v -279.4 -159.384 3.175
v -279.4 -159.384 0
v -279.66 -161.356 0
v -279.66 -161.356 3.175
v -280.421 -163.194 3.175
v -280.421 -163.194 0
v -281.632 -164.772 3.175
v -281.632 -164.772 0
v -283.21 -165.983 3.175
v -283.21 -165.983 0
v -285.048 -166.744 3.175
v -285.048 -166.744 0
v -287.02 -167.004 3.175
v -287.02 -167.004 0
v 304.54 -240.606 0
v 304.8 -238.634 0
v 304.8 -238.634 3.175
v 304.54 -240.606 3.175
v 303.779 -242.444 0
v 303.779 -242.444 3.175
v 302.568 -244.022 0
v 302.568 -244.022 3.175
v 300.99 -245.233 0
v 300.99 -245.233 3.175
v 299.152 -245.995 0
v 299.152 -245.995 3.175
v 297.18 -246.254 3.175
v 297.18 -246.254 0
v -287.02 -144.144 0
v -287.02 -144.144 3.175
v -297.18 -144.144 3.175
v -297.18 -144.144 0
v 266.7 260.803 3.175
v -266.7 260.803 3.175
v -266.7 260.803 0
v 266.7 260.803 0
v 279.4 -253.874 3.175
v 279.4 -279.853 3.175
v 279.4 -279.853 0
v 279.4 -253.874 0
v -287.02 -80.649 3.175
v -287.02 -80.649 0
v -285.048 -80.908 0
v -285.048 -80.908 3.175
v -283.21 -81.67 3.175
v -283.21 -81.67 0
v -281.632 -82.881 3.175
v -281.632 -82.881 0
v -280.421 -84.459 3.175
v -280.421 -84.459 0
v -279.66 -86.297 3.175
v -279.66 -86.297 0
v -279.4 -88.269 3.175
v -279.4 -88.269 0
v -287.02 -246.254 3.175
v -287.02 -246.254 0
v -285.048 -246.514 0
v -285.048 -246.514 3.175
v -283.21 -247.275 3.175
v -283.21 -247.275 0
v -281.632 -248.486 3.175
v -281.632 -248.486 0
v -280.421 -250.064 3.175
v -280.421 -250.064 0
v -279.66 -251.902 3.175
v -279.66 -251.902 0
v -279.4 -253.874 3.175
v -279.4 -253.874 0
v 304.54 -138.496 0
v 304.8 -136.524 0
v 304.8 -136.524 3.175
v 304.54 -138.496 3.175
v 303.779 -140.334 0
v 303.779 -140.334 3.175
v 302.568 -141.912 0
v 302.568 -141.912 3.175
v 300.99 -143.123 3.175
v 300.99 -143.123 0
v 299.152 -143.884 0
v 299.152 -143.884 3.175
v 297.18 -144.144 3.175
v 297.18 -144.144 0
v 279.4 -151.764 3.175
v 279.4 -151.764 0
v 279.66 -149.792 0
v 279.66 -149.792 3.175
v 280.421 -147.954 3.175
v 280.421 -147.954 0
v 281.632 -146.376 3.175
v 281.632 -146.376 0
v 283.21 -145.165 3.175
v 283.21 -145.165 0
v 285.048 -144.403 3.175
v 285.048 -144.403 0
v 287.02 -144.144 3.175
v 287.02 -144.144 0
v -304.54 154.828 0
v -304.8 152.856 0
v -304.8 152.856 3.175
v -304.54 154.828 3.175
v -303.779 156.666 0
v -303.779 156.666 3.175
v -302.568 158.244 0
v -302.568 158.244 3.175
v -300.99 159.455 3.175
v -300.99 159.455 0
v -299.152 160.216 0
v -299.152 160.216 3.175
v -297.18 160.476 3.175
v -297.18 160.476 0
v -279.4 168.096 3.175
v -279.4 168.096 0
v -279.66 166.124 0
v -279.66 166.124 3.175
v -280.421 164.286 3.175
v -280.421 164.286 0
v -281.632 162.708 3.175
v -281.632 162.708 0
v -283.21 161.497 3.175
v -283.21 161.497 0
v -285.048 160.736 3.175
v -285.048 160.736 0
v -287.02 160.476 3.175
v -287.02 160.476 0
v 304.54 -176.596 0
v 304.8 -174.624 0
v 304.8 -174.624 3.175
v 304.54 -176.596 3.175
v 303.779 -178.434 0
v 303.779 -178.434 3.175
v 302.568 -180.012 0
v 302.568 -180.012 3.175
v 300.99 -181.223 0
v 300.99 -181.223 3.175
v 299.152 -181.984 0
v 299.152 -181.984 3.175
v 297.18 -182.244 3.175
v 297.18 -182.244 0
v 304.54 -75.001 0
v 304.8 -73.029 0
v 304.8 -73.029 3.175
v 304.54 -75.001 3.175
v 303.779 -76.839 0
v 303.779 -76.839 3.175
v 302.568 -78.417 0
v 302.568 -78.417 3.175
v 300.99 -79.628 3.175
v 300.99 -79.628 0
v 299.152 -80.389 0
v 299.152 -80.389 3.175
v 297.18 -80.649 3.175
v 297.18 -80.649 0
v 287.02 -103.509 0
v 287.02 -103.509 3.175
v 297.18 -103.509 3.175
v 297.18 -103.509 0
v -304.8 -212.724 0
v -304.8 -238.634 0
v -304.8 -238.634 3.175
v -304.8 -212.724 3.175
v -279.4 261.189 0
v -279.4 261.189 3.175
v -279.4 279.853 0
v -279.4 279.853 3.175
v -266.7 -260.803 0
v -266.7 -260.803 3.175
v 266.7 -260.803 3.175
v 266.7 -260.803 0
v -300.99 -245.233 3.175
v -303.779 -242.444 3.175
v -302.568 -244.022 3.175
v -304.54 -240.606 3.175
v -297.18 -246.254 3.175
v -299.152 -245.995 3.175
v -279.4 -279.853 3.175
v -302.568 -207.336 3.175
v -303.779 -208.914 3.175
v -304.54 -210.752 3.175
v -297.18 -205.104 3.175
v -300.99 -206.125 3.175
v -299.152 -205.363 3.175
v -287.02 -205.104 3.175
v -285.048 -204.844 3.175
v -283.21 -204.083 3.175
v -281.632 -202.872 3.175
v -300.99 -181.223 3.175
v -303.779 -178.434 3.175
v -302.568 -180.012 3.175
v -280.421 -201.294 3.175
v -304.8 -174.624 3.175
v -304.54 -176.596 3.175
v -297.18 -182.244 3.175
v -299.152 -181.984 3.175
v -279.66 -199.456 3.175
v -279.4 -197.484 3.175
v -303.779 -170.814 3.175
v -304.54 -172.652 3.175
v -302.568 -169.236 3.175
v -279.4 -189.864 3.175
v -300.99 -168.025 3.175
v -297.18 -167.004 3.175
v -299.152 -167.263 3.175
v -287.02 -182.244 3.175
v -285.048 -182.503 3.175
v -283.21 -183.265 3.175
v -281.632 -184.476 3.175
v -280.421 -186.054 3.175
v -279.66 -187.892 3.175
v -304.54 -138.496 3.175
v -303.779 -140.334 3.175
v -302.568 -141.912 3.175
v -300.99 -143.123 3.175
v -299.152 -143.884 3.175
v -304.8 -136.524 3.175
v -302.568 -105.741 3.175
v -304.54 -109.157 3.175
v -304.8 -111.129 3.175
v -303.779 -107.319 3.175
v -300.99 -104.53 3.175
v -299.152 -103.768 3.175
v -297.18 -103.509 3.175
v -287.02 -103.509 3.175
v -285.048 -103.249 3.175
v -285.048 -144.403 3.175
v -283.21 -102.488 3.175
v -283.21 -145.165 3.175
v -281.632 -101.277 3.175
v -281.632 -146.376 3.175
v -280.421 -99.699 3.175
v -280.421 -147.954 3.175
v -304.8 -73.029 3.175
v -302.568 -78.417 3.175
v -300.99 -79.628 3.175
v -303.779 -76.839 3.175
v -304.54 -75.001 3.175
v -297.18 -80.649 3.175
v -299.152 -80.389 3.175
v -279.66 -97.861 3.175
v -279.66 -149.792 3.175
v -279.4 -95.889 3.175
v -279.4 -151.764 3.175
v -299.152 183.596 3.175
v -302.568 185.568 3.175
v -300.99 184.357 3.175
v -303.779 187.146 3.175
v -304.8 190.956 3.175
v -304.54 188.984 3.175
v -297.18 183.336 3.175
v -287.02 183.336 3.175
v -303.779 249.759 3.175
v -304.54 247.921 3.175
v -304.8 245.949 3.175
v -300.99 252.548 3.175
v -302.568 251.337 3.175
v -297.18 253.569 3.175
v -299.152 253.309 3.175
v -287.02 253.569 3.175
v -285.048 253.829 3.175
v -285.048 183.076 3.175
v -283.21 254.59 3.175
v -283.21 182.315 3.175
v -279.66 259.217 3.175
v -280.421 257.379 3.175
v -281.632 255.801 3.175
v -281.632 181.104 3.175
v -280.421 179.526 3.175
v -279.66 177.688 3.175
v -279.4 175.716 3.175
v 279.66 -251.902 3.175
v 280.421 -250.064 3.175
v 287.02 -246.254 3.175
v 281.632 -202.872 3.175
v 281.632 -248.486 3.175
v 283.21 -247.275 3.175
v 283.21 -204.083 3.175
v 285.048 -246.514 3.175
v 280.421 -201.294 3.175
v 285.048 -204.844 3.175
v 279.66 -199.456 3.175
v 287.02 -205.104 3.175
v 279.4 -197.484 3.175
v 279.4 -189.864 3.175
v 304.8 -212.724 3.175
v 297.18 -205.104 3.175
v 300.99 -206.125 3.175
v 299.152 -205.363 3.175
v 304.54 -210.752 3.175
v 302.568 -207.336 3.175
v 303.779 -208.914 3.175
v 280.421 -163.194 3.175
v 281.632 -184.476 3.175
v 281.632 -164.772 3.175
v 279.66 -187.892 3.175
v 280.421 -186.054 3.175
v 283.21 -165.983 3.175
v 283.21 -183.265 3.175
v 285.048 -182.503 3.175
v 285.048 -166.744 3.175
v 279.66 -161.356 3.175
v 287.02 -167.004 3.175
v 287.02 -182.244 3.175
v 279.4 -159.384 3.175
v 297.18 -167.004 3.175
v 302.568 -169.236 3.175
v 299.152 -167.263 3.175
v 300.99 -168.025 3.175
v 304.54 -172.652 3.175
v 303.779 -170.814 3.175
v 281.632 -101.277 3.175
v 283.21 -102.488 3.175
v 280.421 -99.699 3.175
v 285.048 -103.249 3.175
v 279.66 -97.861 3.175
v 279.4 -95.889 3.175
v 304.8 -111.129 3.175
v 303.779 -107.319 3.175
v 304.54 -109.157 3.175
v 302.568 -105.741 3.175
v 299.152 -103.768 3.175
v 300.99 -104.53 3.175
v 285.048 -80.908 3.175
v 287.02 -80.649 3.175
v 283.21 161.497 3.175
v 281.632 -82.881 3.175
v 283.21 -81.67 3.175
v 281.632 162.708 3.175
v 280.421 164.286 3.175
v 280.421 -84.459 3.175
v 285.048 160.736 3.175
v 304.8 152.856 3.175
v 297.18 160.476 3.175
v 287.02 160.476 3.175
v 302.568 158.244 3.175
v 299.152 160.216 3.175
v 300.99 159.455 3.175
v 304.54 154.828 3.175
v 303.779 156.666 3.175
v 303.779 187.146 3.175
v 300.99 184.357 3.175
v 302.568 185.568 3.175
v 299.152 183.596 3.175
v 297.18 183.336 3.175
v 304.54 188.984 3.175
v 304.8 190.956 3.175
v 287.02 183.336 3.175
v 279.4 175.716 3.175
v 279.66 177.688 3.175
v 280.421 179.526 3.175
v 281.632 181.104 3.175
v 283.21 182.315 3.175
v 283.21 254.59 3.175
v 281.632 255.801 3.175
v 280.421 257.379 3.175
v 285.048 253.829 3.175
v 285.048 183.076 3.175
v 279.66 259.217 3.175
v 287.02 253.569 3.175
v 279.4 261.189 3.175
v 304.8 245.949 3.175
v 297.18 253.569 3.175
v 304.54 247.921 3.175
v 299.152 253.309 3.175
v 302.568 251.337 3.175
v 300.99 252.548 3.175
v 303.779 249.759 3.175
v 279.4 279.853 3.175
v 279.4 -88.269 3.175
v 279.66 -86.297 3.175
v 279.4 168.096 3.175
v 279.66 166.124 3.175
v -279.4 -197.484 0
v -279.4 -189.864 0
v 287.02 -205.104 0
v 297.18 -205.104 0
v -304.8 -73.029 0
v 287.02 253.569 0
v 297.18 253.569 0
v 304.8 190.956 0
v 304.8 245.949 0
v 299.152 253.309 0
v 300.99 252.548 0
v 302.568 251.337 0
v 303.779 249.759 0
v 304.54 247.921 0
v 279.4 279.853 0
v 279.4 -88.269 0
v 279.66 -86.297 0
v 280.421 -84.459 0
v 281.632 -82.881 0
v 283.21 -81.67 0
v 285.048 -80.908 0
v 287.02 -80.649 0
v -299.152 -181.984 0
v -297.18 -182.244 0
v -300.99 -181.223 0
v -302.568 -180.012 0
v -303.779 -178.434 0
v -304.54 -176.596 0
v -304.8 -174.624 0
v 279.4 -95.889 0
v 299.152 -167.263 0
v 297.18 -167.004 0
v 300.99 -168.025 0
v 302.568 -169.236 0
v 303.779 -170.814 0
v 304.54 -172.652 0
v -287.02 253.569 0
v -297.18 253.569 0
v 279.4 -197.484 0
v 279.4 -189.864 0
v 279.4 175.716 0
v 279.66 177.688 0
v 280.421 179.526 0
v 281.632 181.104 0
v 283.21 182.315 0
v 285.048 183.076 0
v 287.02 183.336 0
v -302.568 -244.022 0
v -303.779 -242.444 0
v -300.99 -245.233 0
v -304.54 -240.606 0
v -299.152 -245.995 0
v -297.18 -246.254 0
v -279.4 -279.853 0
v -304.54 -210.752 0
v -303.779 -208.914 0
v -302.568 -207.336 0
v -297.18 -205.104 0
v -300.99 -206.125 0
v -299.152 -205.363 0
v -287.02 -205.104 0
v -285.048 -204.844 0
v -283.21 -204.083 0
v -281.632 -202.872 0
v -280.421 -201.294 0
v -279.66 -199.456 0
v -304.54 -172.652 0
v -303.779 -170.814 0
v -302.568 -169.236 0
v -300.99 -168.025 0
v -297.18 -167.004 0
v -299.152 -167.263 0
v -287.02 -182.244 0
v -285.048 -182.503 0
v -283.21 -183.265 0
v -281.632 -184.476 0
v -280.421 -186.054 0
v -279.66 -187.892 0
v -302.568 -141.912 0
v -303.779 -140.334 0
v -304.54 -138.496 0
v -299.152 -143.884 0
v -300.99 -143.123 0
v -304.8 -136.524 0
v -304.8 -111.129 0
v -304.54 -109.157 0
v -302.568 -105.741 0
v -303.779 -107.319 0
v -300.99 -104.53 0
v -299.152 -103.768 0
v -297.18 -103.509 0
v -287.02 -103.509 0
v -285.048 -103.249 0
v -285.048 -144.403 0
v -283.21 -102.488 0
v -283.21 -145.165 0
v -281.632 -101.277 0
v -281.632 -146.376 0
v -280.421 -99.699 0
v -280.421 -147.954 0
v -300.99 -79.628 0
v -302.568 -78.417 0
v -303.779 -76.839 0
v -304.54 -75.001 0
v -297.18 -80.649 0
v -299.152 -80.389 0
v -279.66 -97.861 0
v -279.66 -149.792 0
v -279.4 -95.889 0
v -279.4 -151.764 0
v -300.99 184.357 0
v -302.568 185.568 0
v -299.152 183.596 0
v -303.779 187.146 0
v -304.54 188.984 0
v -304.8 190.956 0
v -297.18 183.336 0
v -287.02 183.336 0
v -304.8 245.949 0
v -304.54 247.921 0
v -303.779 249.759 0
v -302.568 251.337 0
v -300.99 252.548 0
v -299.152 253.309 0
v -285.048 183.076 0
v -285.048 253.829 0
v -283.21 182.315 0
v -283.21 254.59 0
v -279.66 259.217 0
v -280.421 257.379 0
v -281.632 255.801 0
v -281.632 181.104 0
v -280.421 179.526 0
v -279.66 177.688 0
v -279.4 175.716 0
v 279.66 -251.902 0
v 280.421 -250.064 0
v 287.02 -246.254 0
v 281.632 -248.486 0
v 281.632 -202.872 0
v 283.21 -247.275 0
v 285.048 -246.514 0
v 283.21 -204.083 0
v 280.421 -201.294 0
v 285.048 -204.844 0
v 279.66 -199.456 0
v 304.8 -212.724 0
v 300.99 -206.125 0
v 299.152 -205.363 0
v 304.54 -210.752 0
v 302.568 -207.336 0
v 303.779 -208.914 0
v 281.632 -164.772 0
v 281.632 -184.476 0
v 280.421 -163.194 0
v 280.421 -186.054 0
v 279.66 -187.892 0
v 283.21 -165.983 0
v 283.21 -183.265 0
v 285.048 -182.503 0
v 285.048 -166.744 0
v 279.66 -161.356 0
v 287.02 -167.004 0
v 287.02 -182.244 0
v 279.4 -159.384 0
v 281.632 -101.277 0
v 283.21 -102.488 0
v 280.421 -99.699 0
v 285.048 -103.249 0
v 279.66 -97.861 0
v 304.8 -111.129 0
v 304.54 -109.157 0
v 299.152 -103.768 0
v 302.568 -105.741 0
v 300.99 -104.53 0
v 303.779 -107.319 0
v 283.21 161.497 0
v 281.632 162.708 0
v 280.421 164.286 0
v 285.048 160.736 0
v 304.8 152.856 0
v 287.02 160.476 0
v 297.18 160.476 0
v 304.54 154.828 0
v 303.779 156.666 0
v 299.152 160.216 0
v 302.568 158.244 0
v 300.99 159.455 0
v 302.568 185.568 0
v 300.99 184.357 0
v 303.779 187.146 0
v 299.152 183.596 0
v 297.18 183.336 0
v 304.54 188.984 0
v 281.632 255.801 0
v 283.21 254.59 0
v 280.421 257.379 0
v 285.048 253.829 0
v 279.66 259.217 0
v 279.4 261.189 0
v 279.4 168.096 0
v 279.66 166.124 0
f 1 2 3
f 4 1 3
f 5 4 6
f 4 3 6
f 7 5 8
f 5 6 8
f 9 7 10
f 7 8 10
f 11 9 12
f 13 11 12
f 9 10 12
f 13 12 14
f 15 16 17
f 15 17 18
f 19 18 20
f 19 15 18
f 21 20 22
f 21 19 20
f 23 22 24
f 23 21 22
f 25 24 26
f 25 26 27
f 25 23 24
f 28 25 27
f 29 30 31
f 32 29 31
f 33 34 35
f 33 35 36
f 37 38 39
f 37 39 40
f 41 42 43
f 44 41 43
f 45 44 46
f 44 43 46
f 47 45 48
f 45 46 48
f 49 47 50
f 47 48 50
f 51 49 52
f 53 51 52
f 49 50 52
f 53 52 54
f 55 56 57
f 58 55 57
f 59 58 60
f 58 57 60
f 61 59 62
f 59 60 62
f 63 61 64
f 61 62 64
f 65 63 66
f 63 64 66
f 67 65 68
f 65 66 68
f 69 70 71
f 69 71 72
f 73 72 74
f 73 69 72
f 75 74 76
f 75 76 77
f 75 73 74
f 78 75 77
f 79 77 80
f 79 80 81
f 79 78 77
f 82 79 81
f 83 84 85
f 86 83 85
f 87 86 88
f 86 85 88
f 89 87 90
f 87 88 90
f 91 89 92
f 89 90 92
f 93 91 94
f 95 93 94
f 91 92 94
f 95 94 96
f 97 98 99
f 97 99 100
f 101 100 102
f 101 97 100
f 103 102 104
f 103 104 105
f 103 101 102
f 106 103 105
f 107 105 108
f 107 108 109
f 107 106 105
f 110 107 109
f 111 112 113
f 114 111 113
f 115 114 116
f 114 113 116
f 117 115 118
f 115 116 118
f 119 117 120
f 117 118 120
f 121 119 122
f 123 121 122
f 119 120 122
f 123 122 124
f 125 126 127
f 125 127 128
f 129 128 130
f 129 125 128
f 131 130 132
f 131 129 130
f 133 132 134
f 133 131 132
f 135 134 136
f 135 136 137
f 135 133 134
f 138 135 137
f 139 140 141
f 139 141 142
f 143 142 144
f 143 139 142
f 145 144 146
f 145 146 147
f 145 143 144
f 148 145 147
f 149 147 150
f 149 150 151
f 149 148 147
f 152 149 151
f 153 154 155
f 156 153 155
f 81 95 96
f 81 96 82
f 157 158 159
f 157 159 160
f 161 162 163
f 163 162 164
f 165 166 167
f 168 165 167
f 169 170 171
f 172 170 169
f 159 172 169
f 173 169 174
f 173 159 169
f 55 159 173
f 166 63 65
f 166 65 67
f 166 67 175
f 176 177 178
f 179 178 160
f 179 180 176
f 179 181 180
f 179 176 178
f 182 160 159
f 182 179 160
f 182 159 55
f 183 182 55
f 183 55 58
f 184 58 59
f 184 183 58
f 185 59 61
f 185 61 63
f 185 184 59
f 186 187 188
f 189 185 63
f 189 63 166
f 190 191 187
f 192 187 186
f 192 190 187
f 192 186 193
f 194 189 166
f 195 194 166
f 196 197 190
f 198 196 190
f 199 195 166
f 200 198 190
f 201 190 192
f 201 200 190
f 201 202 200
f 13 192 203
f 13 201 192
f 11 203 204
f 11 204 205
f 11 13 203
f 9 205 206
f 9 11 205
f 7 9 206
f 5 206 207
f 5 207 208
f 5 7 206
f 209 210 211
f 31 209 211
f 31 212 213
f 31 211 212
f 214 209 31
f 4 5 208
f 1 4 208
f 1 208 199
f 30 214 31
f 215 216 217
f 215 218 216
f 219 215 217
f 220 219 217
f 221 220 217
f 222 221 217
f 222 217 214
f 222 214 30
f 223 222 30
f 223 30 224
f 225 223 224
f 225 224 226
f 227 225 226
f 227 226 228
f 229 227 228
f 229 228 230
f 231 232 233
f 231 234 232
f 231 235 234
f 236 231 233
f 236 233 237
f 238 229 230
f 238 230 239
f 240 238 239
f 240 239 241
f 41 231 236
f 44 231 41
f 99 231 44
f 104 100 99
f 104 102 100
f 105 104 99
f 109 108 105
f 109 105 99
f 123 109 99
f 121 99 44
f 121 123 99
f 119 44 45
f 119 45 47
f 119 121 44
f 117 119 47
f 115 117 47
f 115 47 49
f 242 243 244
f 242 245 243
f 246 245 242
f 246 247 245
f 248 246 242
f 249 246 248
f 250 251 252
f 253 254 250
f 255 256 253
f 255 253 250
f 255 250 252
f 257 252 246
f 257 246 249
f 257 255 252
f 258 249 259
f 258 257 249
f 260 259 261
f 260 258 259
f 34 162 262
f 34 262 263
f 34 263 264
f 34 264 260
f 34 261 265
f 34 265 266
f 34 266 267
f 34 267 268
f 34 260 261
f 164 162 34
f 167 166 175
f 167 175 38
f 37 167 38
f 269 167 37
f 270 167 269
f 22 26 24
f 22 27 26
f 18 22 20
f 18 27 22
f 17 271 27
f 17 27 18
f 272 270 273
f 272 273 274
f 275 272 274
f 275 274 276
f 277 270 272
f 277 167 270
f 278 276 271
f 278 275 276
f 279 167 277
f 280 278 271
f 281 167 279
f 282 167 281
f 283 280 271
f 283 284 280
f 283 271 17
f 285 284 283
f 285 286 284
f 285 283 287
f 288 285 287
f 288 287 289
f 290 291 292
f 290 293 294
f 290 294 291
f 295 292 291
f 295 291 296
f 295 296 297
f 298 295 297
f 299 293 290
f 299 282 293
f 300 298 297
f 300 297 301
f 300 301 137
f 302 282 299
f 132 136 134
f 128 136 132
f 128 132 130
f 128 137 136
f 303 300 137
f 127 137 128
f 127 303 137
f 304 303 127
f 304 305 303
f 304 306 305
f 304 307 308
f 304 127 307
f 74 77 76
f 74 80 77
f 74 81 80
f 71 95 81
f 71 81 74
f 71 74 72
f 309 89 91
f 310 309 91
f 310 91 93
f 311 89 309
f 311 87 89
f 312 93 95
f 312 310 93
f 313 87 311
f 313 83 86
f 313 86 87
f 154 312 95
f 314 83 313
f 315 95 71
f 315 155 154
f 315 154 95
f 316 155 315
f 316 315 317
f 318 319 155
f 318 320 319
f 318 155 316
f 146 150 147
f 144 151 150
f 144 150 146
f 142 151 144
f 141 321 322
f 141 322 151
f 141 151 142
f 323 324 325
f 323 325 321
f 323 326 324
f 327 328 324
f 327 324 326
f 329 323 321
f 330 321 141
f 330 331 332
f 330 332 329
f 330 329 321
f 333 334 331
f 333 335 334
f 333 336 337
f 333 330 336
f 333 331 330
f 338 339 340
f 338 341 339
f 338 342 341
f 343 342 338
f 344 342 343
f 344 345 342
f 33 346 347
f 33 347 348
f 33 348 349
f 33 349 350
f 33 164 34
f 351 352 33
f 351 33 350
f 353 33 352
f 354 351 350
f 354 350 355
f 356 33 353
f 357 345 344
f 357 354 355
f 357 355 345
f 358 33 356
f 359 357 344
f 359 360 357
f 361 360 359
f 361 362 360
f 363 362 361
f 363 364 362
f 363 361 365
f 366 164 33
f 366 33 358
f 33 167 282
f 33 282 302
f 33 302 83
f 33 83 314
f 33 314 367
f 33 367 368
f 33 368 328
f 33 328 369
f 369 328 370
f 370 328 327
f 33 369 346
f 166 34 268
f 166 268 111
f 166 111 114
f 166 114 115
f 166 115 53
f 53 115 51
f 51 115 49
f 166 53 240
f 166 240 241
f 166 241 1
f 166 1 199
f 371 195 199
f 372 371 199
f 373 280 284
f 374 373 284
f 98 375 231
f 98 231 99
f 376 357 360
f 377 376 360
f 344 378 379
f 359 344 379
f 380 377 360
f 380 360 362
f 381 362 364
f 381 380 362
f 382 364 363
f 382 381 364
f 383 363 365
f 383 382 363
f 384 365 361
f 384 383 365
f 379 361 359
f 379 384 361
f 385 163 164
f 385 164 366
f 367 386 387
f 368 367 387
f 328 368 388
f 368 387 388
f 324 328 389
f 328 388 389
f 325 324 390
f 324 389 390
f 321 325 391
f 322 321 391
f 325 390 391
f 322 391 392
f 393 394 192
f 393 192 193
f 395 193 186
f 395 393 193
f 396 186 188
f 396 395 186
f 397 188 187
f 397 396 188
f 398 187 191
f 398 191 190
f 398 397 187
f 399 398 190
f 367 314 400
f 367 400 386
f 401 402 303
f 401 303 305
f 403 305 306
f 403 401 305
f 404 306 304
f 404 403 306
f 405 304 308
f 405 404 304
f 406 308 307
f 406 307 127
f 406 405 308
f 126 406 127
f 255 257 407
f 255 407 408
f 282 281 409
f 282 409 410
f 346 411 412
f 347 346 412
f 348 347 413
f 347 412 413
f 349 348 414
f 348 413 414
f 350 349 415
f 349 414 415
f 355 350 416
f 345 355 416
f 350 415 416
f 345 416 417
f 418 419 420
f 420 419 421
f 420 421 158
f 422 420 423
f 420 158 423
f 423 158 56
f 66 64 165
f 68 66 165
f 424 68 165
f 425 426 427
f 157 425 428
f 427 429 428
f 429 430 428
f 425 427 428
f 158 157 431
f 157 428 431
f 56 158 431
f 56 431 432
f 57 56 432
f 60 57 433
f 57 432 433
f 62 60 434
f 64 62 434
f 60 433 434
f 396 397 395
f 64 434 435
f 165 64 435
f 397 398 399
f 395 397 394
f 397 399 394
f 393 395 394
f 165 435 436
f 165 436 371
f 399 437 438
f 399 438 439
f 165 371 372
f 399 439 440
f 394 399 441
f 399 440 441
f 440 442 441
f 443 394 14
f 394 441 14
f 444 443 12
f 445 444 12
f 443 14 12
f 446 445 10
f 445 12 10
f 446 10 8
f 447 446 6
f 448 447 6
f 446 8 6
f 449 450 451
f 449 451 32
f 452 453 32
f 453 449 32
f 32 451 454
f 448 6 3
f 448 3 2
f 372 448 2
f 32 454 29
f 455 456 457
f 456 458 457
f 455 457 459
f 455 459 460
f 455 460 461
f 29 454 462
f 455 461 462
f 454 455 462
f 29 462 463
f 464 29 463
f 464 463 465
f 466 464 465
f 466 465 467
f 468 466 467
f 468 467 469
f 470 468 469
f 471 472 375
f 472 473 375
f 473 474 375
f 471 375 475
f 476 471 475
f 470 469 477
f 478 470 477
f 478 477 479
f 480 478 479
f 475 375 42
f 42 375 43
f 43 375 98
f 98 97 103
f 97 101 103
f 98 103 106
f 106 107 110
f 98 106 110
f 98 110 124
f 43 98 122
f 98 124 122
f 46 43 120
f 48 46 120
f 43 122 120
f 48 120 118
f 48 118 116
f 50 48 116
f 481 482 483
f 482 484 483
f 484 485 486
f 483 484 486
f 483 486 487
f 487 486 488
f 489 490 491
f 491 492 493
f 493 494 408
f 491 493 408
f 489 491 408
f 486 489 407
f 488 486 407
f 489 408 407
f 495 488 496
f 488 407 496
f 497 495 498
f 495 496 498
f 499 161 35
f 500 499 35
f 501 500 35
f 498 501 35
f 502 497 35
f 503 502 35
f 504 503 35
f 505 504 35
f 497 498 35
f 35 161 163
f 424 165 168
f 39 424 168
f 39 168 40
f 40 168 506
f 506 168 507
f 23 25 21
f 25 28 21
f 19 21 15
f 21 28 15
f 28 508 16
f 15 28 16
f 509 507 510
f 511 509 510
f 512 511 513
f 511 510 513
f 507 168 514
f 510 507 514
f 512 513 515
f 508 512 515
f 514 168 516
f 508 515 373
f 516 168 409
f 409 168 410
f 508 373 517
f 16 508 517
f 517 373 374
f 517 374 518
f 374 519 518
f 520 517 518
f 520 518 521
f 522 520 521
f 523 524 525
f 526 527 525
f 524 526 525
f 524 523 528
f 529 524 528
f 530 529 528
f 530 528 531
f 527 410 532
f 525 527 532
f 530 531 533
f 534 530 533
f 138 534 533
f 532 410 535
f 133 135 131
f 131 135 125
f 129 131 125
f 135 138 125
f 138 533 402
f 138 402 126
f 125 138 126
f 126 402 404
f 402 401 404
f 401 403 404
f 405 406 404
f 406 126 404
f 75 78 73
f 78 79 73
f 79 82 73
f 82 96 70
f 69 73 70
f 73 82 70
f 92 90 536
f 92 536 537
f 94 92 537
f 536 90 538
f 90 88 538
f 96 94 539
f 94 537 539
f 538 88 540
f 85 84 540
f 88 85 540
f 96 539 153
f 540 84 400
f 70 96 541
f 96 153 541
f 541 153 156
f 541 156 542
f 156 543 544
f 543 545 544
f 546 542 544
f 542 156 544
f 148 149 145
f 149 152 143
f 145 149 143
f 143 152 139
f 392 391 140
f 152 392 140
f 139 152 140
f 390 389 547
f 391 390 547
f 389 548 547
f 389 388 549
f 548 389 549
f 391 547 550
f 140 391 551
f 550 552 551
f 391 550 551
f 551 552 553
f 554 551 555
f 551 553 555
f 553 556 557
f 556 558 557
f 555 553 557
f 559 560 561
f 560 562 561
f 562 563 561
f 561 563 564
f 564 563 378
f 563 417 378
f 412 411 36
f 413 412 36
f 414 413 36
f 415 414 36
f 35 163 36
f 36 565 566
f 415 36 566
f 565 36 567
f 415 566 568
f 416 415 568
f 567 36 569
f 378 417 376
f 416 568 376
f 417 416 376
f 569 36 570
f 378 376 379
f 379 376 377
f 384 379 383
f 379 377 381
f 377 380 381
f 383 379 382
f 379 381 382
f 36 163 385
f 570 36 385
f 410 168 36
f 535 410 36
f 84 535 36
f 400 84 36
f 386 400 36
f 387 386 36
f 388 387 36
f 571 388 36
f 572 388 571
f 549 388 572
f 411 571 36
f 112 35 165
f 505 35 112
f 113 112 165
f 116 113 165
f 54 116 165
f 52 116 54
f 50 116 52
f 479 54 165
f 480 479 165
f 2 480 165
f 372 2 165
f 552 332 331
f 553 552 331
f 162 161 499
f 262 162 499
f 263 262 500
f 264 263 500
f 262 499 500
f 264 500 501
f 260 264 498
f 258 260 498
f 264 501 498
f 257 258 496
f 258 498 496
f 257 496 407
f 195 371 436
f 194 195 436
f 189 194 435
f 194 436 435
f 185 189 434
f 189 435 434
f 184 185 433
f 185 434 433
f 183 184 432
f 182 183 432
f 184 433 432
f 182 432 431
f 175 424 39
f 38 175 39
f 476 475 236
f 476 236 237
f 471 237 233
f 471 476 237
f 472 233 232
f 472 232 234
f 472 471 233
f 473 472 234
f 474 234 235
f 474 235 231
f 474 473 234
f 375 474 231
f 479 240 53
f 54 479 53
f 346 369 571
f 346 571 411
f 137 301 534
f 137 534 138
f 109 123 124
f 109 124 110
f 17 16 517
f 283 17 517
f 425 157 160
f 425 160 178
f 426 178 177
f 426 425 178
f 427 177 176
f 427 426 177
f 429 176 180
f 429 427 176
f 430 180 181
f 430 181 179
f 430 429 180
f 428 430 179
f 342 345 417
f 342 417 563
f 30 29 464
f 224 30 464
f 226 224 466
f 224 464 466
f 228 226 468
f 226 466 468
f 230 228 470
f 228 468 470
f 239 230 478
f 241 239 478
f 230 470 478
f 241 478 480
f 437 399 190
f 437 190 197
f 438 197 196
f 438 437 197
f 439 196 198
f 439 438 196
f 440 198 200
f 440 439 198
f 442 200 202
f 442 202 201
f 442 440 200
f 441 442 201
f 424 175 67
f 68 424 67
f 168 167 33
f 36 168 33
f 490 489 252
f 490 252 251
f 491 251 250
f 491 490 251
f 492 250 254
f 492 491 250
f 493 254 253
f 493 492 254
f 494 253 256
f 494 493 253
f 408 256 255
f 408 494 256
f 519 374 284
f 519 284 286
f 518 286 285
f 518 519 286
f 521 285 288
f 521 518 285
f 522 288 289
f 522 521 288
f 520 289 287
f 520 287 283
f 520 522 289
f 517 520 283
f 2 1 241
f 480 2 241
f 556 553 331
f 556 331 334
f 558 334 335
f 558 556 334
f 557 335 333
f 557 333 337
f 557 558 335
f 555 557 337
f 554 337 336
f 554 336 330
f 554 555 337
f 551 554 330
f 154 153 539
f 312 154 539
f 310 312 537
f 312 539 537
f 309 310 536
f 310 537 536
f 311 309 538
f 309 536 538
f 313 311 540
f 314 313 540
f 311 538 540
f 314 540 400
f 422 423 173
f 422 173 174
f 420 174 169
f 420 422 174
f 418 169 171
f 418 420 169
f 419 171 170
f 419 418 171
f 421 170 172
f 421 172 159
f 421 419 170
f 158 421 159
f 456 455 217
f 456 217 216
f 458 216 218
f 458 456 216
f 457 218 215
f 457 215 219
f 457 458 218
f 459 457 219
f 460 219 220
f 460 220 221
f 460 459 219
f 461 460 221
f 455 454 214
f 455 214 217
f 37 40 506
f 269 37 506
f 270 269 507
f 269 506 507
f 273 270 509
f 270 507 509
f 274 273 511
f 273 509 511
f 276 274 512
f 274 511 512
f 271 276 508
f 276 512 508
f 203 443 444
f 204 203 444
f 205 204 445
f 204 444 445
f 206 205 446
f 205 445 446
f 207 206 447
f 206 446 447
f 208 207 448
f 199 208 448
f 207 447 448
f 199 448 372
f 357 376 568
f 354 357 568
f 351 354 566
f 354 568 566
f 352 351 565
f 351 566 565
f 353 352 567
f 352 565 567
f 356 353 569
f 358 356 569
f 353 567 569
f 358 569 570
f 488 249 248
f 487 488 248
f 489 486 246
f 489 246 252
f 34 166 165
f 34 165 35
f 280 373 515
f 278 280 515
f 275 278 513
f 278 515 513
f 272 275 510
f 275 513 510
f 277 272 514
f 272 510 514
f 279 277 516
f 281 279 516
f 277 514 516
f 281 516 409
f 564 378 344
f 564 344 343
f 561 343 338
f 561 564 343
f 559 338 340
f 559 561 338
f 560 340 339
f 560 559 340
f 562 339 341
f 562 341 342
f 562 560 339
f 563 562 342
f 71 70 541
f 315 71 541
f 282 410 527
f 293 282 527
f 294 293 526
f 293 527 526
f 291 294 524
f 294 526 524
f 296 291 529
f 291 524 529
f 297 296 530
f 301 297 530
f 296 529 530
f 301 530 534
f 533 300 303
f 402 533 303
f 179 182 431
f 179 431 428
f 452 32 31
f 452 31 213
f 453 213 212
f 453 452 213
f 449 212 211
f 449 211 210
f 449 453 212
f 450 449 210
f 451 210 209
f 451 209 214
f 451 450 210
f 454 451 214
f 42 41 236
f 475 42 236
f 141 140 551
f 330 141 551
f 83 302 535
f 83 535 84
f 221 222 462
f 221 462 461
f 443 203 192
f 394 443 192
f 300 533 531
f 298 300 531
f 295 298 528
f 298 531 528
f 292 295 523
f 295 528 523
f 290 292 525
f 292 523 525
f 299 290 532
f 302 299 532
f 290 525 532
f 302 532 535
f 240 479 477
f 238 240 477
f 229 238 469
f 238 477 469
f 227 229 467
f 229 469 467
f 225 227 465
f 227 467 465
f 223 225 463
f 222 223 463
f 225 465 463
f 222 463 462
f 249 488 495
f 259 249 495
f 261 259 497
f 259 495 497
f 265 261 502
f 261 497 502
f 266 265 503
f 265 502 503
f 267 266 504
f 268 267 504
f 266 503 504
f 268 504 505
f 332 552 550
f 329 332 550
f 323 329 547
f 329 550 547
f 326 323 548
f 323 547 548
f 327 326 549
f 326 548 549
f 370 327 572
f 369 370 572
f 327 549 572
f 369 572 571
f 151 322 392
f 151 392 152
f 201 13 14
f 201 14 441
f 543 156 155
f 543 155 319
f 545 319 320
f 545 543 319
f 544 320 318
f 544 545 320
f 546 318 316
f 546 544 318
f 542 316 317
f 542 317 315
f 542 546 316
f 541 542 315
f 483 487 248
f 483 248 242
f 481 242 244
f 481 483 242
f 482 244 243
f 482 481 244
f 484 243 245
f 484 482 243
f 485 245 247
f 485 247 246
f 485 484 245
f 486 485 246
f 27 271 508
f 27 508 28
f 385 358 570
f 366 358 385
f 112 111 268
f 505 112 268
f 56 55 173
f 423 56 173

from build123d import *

# Parameters (mm, degrees)
SKETCH1_W           = 609.6
SKETCH1_H           = 559.70678
BOSS_EXTRUDE1_DEPTH = 3.175
SKETCH6_W           = 25.4
SKETCH6_H           = 33.599180378
SKETCH6_H_2         = 22.86
SKETCH6_H_3         = 26.284283972
CUT_EXTRUDE1_DEPTH  = 414.800725615
SKETCH7_W           = 533.4
SKETCH7_H           = 521.60678
CUT_EXTRUDE2_DEPTH  = 414.800725615
FILLET1_START       = -1
FILLET1_DEPTH       = 5
FILLET1_2_DEPTH     = 3.175


with BuildPart() as part:
    # Sketch1 → Boss-Extrude1 (new body)
    with BuildSketch(Plane.XY):
        Rectangle(SKETCH1_W, SKETCH1_H)
    extrude(amount=BOSS_EXTRUDE1_DEPTH)

    # Sketch6 → Cut-Extrude1 (cut, through all)
    with BuildSketch(Plane.XY.offset(3.175)):
        with Locations((292.1, -263.053799811)):
            Rectangle(SKETCH6_W, SKETCH6_H)
        with Locations((292.1, -193.67373)):
            Rectangle(SKETCH6_W, SKETCH6_H_2)
        with Locations((292.1, -155.57373)):
            Rectangle(SKETCH6_W, SKETCH6_H_2)
        with Locations((292.1, -92.07881)):
            Rectangle(SKETCH6_W, SKETCH6_H_2)
        with Locations((292.1, 171.90593)):
            Rectangle(SKETCH6_W, SKETCH6_H_2)
        with Locations((292.1, 266.711248014)):
            Rectangle(SKETCH6_W, SKETCH6_H_3)
    cut_extrude1 = extrude(amount=-CUT_EXTRUDE1_DEPTH, mode=Mode.SUBTRACT)

    # Sketch7 → Cut-Extrude2 (cut, through all)
    with BuildSketch(Plane.XY.offset(3.175)):
        Rectangle(SKETCH7_W, SKETCH7_H)
    extrude(amount=-CUT_EXTRUDE2_DEPTH, mode=Mode.SUBTRACT)

    # Mirror1: Cut-Extrude1 across plane
    add(cut_extrude1.mirror(Plane(origin=(0, 0, 0), x_dir=(0, 0, 1), z_dir=(1, 0, 0))), mode=Mode.SUBTRACT)

    # Fillet1: read off the stored shape, not the designer's step
    # Fillet1 outline → Fillet1 (cut)
    with BuildSketch(Plane.XY.offset(FILLET1_START)):
        with BuildLine():
            ThreePointArc((-297.18, -246.254209622), (-302.568153673, -244.022363295), (-304.8, -238.634209622))
            Line((-304.8, -238.634209622), (-304.8, -246.254209622))
            Line((-304.8, -246.254209622), (-297.18, -246.254209622))
        make_face()
        with BuildLine():
            ThreePointArc((-304.8, -212.72373), (-302.568153673, -207.335576327), (-297.18, -205.10373))
            Line((-297.18, -205.10373), (-304.8, -205.10373))
            Line((-304.8, -205.10373), (-304.8, -212.72373))
        make_face()
        with BuildLine():
            ThreePointArc((-297.18, -182.24373), (-302.568153673, -180.011883673), (-304.8, -174.62373))
            Line((-304.8, -174.62373), (-304.8, -182.24373))
            Line((-304.8, -182.24373), (-297.18, -182.24373))
        make_face()
        with BuildLine():
            ThreePointArc((-304.8, -174.62373), (-302.568153673, -169.235576327), (-297.18, -167.00373))
            Line((-297.18, -167.00373), (-304.8, -167.00373))
            Line((-304.8, -167.00373), (-304.8, -174.62373))
        make_face()
        with BuildLine():
            ThreePointArc((-297.18, -144.14373), (-302.568153673, -141.911883673), (-304.8, -136.52373))
            Line((-304.8, -136.52373), (-304.8, -144.14373))
            Line((-304.8, -144.14373), (-297.18, -144.14373))
        make_face()
        with BuildLine():
            ThreePointArc((-304.8, -111.12881), (-302.568153673, -105.740656327), (-297.18, -103.50881))
            Line((-297.18, -103.50881), (-304.8, -103.50881))
            Line((-304.8, -103.50881), (-304.8, -111.12881))
        make_face()
        with BuildLine():
            ThreePointArc((-297.18, -80.64881), (-302.568153673, -78.416963673), (-304.8, -73.02881))
            Line((-304.8, -73.02881), (-304.8, -80.64881))
            Line((-304.8, -80.64881), (-297.18, -80.64881))
        make_face()
        with BuildLine():
            ThreePointArc((-304.8, 152.85593), (-302.568153673, 158.244083673), (-297.18, 160.47593))
            Line((-297.18, 160.47593), (-304.8, 160.47593))
            Line((-304.8, 160.47593), (-304.8, 152.85593))
        make_face()
        with BuildLine():
            ThreePointArc((-297.18, 183.33593), (-302.568153673, 185.567776327), (-304.8, 190.95593))
            Line((-304.8, 190.95593), (-304.8, 183.33593))
            Line((-304.8, 183.33593), (-297.18, 183.33593))
        make_face()
        with BuildLine():
            ThreePointArc((-304.8, 245.949106028), (-302.568153672, 251.3372597), (-297.18, 253.569106028))
            Line((-297.18, 253.569106028), (-304.8, 253.569106028))
            Line((-304.8, 253.569106028), (-304.8, 245.949106028))
        make_face()
        with BuildLine():
            ThreePointArc((297.18, 253.569106028), (302.568153672, 251.3372597), (304.8, 245.949106028))
            Line((304.8, 245.949106028), (304.8, 253.569106028))
            Line((304.8, 253.569106028), (297.18, 253.569106028))
        make_face()
        with BuildLine():
            ThreePointArc((304.8, 190.95593), (302.568153673, 185.567776327), (297.18, 183.33593))
            Line((297.18, 183.33593), (304.8, 183.33593))
            Line((304.8, 183.33593), (304.8, 190.95593))
        make_face()
        with BuildLine():
            ThreePointArc((297.18, 160.47593), (302.568153673, 158.244083673), (304.8, 152.85593))
            Line((304.8, 152.85593), (304.8, 160.47593))
            Line((304.8, 160.47593), (297.18, 160.47593))
        make_face()
        with BuildLine():
            ThreePointArc((304.8, -73.02881), (302.568153673, -78.416963673), (297.18, -80.64881))
            Line((297.18, -80.64881), (304.8, -80.64881))
            Line((304.8, -80.64881), (304.8, -73.02881))
        make_face()
        with BuildLine():
            ThreePointArc((297.18, -103.50881), (302.568153673, -105.740656327), (304.8, -111.12881))
            Line((304.8, -111.12881), (304.8, -103.50881))
            Line((304.8, -103.50881), (297.18, -103.50881))
        make_face()
        with BuildLine():
            ThreePointArc((304.8, -136.52373), (302.568153673, -141.911883673), (297.18, -144.14373))
            Line((297.18, -144.14373), (304.8, -144.14373))
            Line((304.8, -144.14373), (304.8, -136.52373))
        make_face()
        with BuildLine():
            ThreePointArc((297.18, -167.00373), (302.568153673, -169.235576327), (304.8, -174.62373))
            Line((304.8, -174.62373), (304.8, -167.00373))
            Line((304.8, -167.00373), (297.18, -167.00373))
        make_face()
        with BuildLine():
            ThreePointArc((304.8, -174.62373), (302.568153673, -180.011883673), (297.18, -182.24373))
            Line((297.18, -182.24373), (304.8, -182.24373))
            Line((304.8, -182.24373), (304.8, -174.62373))
        make_face()
        with BuildLine():
            ThreePointArc((297.18, -205.10373), (302.568153673, -207.335576327), (304.8, -212.72373))
            Line((304.8, -212.72373), (304.8, -205.10373))
            Line((304.8, -205.10373), (297.18, -205.10373))
        make_face()
        with BuildLine():
            ThreePointArc((304.8, -238.634209622), (302.568153673, -244.022363295), (297.18, -246.254209622))
            Line((297.18, -246.254209622), (304.8, -246.254209622))
            Line((304.8, -246.254209622), (304.8, -238.634209622))
        make_face()
    extrude(amount=FILLET1_DEPTH, mode=Mode.SUBTRACT)

    # Fillet1 2 outline → Fillet1 2 (add)
    with BuildSketch(Plane.XY):
        with BuildLine():
            Line((-279.4, 253.569106028), (-279.4, 261.189106028))
            ThreePointArc((-279.4, 261.189106028), (-281.631846327, 255.800952355), (-287.02, 253.569106028))
            Line((-287.02, 253.569106028), (-279.4, 253.569106028))
        make_face()
        with BuildLine():
            Line((-279.4, -246.254209622), (-287.02, -246.254209622))
            ThreePointArc((-287.02, -246.254209622), (-281.631846327, -248.48605595), (-279.4, -253.874209622))
            Line((-279.4, -253.874209622), (-279.4, -246.254209622))
        make_face()
        with BuildLine():
            Line((-279.4, -205.10373), (-279.4, -197.48373))
            ThreePointArc((-279.4, -197.48373), (-281.631846327, -202.871883673), (-287.02, -205.10373))
            Line((-287.02, -205.10373), (-279.4, -205.10373))
        make_face()
        with BuildLine():
            Line((-279.4, -182.24373), (-287.02, -182.24373))
            ThreePointArc((-287.02, -182.24373), (-281.631846327, -184.475576327), (-279.4, -189.86373))
            Line((-279.4, -189.86373), (-279.4, -182.24373))
        make_face()
        with BuildLine():
            Line((-279.4, -167.00373), (-279.4, -159.38373))
            ThreePointArc((-279.4, -159.38373), (-281.631846327, -164.771883673), (-287.02, -167.00373))
            Line((-287.02, -167.00373), (-279.4, -167.00373))
        make_face()
        with BuildLine():
            Line((-279.4, -144.14373), (-287.02, -144.14373))
            ThreePointArc((-287.02, -144.14373), (-281.631846327, -146.375576327), (-279.4, -151.76373))
            Line((-279.4, -151.76373), (-279.4, -144.14373))
        make_face()
        with BuildLine():
            Line((-279.4, -103.50881), (-279.4, -95.88881))
            ThreePointArc((-279.4, -95.88881), (-281.631846327, -101.276963673), (-287.02, -103.50881))
            Line((-287.02, -103.50881), (-279.4, -103.50881))
        make_face()
        with BuildLine():
            Line((-279.4, -80.64881), (-287.02, -80.64881))
            ThreePointArc((-287.02, -80.64881), (-281.631846327, -82.880656327), (-279.4, -88.26881))
            Line((-279.4, -88.26881), (-279.4, -80.64881))
        make_face()
        with BuildLine():
            Line((-279.4, 160.47593), (-279.4, 168.09593))
            ThreePointArc((-279.4, 168.09593), (-281.631846327, 162.707776327), (-287.02, 160.47593))
            Line((-287.02, 160.47593), (-279.4, 160.47593))
        make_face()
        with BuildLine():
            Line((-279.4, 183.33593), (-287.02, 183.33593))
            ThreePointArc((-287.02, 183.33593), (-281.631846327, 181.104083673), (-279.4, 175.71593))
            Line((-279.4, 175.71593), (-279.4, 183.33593))
        make_face()
        with BuildLine():
            Line((279.4, -246.254209622), (279.4, -253.874209622))
            ThreePointArc((279.4, -253.874209622), (281.631846327, -248.48605595), (287.02, -246.254209622))
            Line((287.02, -246.254209622), (279.4, -246.254209622))
        make_face()
        with BuildLine():
            Line((279.4, 253.569106028), (287.02, 253.569106028))
            ThreePointArc((287.02, 253.569106028), (281.631846327, 255.800952355), (279.4, 261.189106028))
            Line((279.4, 261.189106028), (279.4, 253.569106028))
        make_face()
        with BuildLine():
            Line((279.4, 183.33593), (279.4, 175.71593))
            ThreePointArc((279.4, 175.71593), (281.631846327, 181.104083673), (287.02, 183.33593))
            Line((287.02, 183.33593), (279.4, 183.33593))
        make_face()
        with BuildLine():
            Line((279.4, 160.47593), (287.02, 160.47593))
            ThreePointArc((287.02, 160.47593), (281.631846327, 162.707776327), (279.4, 168.09593))
            Line((279.4, 168.09593), (279.4, 160.47593))
        make_face()
        with BuildLine():
            Line((279.4, -80.64881), (279.4, -88.26881))
            ThreePointArc((279.4, -88.26881), (281.631846327, -82.880656327), (287.02, -80.64881))
            Line((287.02, -80.64881), (279.4, -80.64881))
        make_face()
        with BuildLine():
            Line((279.4, -103.50881), (287.02, -103.50881))
            ThreePointArc((287.02, -103.50881), (281.631846327, -101.276963673), (279.4, -95.88881))
            Line((279.4, -95.88881), (279.4, -103.50881))
        make_face()
        with BuildLine():
            Line((279.4, -144.14373), (279.4, -151.76373))
            ThreePointArc((279.4, -151.76373), (281.631846327, -146.375576327), (287.02, -144.14373))
            Line((287.02, -144.14373), (279.4, -144.14373))
        make_face()
        with BuildLine():
            Line((279.4, -167.00373), (287.02, -167.00373))
            ThreePointArc((287.02, -167.00373), (281.631846327, -164.771883673), (279.4, -159.38373))
            Line((279.4, -159.38373), (279.4, -167.00373))
        make_face()
        with BuildLine():
            Line((279.4, -182.24373), (279.4, -189.86373))
            ThreePointArc((279.4, -189.86373), (281.631846327, -184.475576327), (287.02, -182.24373))
            Line((287.02, -182.24373), (279.4, -182.24373))
        make_face()
        with BuildLine():
            Line((279.4, -205.10373), (287.02, -205.10373))
            ThreePointArc((287.02, -205.10373), (281.631846327, -202.871883673), (279.4, -197.48373))
            Line((279.4, -197.48373), (279.4, -205.10373))
        make_face()
    extrude(amount=FILLET1_2_DEPTH)


solid = part.part
